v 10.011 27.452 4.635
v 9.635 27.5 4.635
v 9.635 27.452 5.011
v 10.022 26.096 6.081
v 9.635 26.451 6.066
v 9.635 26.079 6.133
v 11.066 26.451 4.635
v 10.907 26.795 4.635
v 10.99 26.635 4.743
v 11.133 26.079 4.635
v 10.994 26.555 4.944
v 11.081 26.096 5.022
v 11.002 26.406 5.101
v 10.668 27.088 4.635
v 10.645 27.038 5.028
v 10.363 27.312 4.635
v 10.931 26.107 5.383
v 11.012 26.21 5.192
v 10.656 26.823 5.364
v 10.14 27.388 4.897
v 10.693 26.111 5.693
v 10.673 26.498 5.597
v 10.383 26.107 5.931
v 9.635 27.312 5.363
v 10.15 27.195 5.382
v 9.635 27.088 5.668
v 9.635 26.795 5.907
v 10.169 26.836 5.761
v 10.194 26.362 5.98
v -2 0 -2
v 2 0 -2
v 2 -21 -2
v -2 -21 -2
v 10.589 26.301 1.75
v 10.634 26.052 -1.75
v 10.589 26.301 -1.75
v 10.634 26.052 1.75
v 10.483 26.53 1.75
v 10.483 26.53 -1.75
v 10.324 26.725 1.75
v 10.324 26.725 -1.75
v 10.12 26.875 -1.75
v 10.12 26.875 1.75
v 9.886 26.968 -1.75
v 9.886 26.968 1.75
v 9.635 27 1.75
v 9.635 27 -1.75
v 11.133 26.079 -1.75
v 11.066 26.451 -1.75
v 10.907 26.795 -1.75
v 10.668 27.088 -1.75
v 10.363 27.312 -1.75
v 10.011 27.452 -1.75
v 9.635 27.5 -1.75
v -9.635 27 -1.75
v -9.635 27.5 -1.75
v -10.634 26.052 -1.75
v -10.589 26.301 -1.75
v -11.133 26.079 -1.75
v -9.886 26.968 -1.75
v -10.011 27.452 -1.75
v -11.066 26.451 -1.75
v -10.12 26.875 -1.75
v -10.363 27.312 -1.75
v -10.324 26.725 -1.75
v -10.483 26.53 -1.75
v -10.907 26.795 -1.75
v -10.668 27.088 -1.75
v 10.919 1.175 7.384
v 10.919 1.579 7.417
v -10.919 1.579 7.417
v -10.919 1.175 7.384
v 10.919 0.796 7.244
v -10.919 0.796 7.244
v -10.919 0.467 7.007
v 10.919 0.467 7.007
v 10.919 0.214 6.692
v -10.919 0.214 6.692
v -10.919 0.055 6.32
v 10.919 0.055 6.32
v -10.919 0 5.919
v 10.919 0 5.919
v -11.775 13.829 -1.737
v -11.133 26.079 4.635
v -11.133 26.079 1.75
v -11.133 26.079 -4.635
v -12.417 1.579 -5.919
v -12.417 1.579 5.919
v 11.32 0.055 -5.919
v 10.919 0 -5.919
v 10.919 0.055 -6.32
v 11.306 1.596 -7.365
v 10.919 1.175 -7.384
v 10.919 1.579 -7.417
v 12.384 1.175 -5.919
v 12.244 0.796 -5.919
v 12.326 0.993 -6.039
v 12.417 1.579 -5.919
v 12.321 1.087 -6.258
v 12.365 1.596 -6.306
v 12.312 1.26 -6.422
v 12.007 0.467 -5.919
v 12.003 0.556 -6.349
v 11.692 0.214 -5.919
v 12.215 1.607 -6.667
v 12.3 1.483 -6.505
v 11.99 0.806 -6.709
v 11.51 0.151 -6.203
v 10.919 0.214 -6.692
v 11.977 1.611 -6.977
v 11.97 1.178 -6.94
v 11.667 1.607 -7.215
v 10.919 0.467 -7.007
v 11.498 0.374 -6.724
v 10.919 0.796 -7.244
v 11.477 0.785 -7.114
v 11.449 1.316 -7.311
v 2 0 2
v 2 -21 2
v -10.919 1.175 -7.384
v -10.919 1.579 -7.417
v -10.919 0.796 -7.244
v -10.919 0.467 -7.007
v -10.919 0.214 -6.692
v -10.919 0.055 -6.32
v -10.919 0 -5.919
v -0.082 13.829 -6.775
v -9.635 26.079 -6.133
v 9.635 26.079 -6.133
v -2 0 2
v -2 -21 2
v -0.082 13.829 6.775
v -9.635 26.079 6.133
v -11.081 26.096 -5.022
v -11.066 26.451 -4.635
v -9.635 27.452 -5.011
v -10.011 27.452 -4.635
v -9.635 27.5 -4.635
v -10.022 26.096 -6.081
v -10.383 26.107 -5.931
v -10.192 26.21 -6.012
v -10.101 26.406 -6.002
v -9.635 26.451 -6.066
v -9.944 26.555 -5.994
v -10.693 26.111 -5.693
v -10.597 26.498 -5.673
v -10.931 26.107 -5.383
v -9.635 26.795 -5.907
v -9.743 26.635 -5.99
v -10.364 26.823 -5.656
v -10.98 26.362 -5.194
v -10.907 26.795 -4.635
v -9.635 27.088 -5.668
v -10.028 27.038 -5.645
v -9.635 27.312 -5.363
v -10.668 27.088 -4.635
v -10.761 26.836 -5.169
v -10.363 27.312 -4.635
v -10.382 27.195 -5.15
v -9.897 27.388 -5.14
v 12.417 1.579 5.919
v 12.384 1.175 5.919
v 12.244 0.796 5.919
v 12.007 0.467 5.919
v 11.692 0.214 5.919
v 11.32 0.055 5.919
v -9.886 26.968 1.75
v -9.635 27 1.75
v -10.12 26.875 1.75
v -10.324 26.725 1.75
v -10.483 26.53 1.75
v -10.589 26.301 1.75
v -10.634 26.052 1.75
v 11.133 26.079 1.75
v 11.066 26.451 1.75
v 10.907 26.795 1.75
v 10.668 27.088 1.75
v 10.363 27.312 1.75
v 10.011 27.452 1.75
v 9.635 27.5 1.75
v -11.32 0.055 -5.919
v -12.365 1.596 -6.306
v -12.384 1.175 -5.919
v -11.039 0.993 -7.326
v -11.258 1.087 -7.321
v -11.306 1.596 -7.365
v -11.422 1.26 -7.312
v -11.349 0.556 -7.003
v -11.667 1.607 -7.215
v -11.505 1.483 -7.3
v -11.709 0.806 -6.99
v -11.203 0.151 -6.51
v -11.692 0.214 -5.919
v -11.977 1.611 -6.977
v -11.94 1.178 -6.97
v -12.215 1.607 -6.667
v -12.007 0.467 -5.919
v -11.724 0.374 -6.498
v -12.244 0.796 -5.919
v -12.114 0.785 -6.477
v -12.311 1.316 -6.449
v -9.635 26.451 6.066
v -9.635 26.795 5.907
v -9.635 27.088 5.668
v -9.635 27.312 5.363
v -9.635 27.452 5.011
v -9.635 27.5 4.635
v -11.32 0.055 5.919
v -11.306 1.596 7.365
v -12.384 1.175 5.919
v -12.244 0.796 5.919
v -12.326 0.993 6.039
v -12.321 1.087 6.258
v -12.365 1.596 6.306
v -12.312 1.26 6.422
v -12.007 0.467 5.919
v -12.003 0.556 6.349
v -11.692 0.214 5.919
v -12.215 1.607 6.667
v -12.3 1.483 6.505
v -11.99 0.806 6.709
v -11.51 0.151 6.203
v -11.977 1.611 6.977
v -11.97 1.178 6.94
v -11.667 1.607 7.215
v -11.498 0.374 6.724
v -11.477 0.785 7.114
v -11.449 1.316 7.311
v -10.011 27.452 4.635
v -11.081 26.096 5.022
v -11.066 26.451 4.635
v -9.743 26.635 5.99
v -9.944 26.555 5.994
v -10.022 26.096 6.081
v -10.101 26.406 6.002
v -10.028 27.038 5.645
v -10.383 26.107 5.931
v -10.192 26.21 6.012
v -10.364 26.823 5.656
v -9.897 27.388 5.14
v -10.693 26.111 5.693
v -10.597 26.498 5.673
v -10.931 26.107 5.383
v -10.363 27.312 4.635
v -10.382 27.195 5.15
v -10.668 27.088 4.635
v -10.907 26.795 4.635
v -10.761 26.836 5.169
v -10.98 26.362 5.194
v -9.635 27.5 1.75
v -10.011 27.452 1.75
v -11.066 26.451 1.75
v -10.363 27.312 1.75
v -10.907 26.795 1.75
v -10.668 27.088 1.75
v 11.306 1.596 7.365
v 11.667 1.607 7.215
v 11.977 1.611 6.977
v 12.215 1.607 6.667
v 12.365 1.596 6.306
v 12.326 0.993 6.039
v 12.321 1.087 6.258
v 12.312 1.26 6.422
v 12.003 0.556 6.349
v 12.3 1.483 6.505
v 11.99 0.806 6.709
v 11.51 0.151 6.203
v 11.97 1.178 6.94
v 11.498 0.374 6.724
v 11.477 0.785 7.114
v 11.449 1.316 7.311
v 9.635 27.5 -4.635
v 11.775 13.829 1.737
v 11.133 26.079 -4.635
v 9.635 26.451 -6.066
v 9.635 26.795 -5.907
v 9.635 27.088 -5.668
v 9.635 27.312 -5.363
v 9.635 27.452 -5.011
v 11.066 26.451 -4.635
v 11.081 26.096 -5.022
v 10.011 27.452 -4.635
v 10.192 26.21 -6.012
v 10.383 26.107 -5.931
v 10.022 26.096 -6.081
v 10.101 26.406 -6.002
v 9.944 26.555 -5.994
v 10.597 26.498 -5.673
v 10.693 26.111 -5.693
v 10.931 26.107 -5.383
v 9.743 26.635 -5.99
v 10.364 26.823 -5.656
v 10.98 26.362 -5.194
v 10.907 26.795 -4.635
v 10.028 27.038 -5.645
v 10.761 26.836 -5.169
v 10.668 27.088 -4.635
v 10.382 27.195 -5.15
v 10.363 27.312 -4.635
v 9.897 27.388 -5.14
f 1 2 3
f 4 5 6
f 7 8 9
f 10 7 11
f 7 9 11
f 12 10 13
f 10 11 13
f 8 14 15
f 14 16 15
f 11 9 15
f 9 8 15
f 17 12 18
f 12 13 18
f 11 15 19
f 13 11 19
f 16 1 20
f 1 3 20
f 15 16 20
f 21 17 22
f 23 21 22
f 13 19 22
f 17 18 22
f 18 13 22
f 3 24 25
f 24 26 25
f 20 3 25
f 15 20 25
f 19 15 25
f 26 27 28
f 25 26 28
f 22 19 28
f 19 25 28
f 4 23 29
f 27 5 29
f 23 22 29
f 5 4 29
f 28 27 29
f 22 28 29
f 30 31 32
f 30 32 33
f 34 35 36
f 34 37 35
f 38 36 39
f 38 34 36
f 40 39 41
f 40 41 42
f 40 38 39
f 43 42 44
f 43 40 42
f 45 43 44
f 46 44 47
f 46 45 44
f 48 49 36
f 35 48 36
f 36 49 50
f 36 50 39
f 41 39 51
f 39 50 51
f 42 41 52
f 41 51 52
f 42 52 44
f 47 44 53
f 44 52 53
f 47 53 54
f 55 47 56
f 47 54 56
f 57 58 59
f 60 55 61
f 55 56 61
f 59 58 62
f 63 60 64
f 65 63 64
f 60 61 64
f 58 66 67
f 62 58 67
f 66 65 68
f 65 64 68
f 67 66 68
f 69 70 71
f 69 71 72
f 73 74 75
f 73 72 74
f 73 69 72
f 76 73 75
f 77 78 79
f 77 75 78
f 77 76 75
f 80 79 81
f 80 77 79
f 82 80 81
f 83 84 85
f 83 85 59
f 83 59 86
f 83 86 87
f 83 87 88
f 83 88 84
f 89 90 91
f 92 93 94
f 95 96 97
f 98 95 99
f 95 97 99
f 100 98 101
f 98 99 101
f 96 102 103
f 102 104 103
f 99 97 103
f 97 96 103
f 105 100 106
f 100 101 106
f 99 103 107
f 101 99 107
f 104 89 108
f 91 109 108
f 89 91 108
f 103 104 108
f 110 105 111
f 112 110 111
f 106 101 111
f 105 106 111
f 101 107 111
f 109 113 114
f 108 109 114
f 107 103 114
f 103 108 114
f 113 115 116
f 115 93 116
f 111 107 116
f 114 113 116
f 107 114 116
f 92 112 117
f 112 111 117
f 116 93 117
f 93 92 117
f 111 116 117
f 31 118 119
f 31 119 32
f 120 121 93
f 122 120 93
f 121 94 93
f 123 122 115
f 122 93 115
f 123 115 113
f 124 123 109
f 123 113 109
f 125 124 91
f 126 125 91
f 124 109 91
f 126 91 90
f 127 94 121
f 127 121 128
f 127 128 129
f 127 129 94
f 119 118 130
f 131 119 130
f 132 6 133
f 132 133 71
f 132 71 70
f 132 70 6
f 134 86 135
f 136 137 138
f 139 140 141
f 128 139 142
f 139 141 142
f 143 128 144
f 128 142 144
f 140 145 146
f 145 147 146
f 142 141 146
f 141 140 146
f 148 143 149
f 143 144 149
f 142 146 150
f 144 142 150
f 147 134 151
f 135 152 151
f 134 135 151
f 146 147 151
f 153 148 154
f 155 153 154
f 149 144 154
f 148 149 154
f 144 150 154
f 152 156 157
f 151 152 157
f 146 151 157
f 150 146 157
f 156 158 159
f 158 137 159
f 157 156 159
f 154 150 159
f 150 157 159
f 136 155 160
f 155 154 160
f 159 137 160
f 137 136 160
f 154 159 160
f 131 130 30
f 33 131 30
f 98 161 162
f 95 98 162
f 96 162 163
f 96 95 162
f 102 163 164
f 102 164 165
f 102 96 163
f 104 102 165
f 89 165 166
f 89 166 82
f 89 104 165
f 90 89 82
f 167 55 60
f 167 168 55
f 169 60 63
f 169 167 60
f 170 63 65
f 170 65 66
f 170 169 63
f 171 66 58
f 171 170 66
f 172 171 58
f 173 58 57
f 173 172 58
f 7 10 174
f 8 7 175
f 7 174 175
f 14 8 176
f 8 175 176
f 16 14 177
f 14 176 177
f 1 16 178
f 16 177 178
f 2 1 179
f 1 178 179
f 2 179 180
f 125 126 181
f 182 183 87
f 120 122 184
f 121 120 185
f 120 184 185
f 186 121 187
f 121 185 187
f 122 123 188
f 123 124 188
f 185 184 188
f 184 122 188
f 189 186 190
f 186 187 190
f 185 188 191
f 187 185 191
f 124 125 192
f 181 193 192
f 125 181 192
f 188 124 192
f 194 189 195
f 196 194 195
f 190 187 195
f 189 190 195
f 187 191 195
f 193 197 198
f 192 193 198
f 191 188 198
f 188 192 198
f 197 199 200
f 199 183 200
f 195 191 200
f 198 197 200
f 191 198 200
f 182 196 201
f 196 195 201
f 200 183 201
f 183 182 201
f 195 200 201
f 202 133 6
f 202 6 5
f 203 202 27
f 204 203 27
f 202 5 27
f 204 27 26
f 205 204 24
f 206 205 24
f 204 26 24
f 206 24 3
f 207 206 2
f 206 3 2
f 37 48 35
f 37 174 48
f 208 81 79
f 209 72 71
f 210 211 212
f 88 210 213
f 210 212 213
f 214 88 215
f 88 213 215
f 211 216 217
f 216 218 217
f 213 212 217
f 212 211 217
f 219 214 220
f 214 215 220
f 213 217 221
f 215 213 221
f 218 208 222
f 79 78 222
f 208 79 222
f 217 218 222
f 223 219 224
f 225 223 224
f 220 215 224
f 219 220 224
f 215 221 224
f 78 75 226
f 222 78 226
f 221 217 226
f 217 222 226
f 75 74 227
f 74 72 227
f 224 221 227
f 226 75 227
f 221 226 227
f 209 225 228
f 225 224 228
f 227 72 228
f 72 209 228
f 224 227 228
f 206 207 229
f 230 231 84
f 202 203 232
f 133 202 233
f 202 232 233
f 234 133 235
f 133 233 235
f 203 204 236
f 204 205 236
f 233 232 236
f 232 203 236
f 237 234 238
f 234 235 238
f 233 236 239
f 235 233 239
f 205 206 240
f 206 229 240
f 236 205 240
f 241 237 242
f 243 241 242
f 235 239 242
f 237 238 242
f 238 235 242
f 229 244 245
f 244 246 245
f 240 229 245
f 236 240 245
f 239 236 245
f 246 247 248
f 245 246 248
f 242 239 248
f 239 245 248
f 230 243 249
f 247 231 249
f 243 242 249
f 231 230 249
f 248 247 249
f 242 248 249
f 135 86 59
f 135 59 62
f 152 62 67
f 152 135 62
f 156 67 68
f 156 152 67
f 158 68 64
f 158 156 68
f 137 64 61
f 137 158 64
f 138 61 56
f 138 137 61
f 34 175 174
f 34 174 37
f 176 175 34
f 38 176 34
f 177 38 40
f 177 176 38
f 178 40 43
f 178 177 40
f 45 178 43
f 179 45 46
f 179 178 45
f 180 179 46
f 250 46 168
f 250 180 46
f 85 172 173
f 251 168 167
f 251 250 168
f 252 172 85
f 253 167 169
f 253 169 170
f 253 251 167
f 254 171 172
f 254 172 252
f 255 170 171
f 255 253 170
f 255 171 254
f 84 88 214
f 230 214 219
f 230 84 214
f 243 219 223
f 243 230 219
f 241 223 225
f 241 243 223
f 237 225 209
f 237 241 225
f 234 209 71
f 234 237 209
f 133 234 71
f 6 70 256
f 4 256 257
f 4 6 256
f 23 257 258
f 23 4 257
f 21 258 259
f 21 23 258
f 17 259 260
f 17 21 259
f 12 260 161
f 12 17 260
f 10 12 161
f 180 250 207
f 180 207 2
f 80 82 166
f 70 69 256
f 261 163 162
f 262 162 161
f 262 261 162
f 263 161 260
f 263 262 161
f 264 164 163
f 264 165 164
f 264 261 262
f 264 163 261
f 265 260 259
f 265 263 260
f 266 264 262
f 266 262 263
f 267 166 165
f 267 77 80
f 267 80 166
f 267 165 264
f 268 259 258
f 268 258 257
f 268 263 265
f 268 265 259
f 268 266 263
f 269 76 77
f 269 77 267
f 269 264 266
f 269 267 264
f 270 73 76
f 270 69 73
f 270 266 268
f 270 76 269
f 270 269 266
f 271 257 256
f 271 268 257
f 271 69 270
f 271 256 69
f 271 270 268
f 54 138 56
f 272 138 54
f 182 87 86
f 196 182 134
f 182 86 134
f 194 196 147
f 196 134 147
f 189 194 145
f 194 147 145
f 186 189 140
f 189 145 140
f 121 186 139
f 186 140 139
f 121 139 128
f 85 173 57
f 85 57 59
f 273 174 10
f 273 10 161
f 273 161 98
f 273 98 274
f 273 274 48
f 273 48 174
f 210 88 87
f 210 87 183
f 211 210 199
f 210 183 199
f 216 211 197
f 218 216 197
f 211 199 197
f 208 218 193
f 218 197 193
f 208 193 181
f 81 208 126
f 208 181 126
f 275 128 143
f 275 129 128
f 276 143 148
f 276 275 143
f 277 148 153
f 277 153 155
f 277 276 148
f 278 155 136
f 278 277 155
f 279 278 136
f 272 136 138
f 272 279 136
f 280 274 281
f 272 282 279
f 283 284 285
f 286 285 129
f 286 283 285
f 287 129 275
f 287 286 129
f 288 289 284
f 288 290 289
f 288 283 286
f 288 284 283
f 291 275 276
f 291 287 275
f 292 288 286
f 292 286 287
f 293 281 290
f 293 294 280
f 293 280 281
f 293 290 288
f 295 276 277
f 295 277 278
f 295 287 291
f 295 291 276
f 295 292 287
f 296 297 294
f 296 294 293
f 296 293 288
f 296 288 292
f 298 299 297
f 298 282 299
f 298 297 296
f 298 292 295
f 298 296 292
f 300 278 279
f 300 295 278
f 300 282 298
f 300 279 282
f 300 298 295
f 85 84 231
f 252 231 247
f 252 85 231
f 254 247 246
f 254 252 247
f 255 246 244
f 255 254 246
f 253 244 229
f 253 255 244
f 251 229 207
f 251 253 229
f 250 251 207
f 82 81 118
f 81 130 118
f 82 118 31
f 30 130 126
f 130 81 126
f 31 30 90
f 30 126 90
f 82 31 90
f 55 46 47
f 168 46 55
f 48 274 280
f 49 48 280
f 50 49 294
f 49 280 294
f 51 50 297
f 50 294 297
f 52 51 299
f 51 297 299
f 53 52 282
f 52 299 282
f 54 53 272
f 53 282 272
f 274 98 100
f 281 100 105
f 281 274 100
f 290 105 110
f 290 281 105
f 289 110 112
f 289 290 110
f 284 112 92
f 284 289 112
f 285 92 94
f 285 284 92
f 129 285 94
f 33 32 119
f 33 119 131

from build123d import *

# Parameters (mm, degrees)
SKETCH1_W           = 25
SKETCH1_H           = 15
BOSS_EXTRUDE1_DEPTH = 27.5
BOSS_EXTRUDE1_TAPER = 3
FILLET1_R           = 1.5
SKETCH2_W           = 4
SKETCH2_H           = 4
BOSS_EXTRUDE2_DEPTH = 21
CUT_EXTRUDE1_DEPTH  = 1.75


with BuildPart() as part:
    # Sketch1 → Boss-Extrude1 (new body)
    with BuildSketch(Plane(origin=(0, 0, 0), x_dir=(1, 0, 0), z_dir=(0, 1, 0))):
        Rectangle(SKETCH1_W, SKETCH1_H)
    extrude(amount=BOSS_EXTRUDE1_DEPTH, taper=BOSS_EXTRUDE1_TAPER)

    # Fillet1
    fillet1_edges = [part.edges().sort_by_distance(p)[0] for p in [
        (-11.05878607, 27.5, 0),
        (0, 27.5, 6.05878607),
        (11.05878607, 27.5, 0),
        (0, 0, 7.5),
        (-12.5, 0, 0),
        (0, 0, -7.5),
        (12.5, 0, 0),
        (11.779393035, 13.75, 6.779393035),
        (-11.779393035, 13.75, 6.779393035),
        (-11.779393035, 13.75, -6.779393035),
        (11.779393035, 13.75, -6.779393035),
        (0, 27.5, -6.05878607),
    ]]
    fillet(fillet1_edges, radius=FILLET1_R)

    # Sketch2 → Boss-Extrude2 (add)
    with BuildSketch(Plane(origin=(0, 0, 0), x_dir=(-1, 0, 0), z_dir=(0, -1, 0))):
        Rectangle(SKETCH2_W, SKETCH2_H)
    extrude(amount=BOSS_EXTRUDE2_DEPTH)

    # Sketch3 → Cut-Extrude1 (cut, symmetric)
    with BuildSketch(Plane.XY):
        with BuildLine():
            Line((-9.63533922, 27.5), (9.63533922, 27.5))
            ThreePointArc((9.63533922, 27.5), (10.667871083, 27.088061557), (11.133283522, 26.078503934))
            Line((11.133283522, 26.078503934), (10.633968754, 26.052335956))
            ThreePointArc((10.633968754, 26.052335956), (10.323693795, 26.725374371), (9.63533922, 27))
            Line((9.63533922, 27), (-9.63533922, 27))
            ThreePointArc((-9.63533922, 27), (-10.323693795, 26.725374371), (-10.633968754, 26.052335956))
            Line((-10.633968754, 26.052335956), (-11.133283522, 26.078503934))
            ThreePointArc((-11.133283522, 26.078503934), (-10.667871083, 27.088061557), (-9.63533922, 27.5))
        make_face()
    extrude(amount=CUT_EXTRUDE1_DEPTH, both=True, mode=Mode.SUBTRACT)


solid = part.part
